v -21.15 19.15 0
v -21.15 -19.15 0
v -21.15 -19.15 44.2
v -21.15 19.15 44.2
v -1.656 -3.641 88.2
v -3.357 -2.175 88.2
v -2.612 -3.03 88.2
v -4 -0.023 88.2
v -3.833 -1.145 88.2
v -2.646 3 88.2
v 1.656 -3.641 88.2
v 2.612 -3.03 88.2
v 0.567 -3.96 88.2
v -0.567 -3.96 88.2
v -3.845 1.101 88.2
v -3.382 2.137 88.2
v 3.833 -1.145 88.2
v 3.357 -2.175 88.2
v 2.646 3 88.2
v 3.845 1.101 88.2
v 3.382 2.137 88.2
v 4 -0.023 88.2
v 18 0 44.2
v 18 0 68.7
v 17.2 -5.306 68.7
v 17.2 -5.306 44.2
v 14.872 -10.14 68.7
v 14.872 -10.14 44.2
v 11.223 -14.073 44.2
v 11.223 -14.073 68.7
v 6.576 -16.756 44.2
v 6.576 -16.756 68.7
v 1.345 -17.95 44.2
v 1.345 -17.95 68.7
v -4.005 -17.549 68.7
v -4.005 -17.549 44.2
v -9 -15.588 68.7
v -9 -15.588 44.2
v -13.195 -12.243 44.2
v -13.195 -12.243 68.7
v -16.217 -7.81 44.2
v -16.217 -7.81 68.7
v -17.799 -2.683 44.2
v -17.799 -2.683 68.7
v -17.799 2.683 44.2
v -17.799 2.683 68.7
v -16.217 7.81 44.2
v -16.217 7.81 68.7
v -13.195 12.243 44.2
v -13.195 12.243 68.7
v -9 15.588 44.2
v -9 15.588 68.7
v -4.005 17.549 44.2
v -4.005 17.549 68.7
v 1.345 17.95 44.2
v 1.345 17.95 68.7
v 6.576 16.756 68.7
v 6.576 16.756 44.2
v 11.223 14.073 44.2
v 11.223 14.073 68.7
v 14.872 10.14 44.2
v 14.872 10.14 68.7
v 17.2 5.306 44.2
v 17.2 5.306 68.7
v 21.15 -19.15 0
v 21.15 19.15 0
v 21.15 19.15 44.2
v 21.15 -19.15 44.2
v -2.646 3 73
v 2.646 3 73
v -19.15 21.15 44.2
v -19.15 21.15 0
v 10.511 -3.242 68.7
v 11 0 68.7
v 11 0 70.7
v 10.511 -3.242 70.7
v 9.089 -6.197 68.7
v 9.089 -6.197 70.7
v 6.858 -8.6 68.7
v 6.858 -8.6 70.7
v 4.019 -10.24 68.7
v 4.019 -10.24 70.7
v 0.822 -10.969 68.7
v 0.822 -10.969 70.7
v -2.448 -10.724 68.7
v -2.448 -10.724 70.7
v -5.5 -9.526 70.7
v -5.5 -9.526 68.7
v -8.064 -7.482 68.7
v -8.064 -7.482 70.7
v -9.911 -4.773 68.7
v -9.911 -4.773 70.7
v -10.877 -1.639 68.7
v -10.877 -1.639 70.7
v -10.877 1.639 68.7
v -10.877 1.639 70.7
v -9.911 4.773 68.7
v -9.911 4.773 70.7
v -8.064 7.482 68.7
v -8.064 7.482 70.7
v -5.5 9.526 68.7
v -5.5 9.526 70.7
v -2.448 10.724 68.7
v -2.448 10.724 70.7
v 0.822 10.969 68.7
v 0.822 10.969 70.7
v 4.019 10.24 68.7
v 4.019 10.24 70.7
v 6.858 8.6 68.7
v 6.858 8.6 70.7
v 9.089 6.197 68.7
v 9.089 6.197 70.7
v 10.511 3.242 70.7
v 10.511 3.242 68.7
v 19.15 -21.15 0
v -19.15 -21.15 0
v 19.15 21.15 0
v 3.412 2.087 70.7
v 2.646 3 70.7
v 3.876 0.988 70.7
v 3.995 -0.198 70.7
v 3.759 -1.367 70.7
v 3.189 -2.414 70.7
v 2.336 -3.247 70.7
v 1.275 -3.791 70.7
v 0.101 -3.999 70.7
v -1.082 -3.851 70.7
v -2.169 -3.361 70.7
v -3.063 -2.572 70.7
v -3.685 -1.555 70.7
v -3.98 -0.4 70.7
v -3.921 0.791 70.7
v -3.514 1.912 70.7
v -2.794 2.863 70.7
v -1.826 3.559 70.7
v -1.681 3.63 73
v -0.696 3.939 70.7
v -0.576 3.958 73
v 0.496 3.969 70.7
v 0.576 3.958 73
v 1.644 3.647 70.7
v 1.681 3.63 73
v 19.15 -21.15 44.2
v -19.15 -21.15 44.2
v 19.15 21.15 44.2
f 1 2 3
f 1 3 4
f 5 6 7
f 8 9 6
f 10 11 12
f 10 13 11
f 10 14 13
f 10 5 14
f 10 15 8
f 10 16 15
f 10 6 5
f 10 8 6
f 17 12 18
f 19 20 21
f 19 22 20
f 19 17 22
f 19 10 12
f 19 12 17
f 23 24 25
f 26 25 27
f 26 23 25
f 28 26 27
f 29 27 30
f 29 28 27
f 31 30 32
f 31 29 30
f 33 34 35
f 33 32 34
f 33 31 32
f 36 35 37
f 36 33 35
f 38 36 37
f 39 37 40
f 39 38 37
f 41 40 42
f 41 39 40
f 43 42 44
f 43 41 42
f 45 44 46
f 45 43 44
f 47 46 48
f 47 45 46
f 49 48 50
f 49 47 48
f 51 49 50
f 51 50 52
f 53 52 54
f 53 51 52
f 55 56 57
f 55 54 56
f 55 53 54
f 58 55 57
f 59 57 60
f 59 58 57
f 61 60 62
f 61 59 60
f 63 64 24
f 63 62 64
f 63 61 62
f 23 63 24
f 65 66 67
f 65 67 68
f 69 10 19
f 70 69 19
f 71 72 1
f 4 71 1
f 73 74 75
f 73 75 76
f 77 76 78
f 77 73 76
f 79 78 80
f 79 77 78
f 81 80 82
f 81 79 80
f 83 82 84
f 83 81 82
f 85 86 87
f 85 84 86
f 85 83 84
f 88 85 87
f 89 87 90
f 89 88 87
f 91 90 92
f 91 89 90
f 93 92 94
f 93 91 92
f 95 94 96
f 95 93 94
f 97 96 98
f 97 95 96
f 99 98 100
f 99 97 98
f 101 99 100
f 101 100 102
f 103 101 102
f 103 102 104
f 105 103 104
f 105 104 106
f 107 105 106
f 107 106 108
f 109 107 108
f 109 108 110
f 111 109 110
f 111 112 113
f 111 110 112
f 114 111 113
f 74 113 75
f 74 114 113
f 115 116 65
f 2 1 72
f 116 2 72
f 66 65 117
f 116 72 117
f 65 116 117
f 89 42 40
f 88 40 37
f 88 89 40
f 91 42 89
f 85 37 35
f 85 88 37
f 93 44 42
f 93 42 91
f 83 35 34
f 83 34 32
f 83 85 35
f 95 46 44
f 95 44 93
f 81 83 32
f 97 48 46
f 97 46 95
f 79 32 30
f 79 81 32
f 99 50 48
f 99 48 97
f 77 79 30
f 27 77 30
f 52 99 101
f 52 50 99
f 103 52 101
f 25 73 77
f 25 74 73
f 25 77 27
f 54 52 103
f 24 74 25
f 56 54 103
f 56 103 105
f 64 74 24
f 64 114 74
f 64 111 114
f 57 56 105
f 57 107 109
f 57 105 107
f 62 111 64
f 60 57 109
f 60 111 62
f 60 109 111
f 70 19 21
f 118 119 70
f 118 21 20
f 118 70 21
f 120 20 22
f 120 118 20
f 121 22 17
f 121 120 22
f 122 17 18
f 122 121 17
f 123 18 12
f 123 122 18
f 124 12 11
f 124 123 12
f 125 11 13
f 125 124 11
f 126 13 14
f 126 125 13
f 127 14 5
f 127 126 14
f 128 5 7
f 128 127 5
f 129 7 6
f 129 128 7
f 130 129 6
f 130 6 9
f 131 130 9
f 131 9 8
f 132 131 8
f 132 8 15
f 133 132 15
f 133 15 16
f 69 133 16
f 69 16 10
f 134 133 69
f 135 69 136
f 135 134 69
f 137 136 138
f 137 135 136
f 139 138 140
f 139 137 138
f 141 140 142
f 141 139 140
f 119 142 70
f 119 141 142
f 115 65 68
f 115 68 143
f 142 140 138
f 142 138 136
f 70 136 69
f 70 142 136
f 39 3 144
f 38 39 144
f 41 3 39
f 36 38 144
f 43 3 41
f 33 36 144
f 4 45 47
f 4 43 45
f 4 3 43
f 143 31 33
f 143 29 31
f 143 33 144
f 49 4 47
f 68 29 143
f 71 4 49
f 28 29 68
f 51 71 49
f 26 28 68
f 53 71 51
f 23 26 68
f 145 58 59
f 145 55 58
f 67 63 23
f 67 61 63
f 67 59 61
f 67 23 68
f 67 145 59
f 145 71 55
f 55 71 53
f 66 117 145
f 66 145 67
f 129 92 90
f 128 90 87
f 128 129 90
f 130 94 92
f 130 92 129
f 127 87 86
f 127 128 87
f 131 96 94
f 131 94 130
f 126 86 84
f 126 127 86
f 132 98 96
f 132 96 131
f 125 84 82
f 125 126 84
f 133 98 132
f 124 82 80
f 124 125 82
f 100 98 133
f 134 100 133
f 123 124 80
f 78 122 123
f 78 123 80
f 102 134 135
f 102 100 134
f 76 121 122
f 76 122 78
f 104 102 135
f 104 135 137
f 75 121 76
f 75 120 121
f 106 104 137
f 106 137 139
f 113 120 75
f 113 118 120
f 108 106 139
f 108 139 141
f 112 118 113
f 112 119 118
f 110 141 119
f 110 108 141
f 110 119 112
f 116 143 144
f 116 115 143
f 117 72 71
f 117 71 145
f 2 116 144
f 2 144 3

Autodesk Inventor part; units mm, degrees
ref_plane "YZ Plane" through (0, 0, 0) normal (1, 0, 0) x (0, 1, 0)
ref_plane "XZ Plane" through (0, 0, 0) normal (0, 1, 0) x (-1, 0, 0)
ref_plane "XY Plane" through (0, 0, 0) normal (0, 0, 1) x (1, 0, 0)
sketch "Sketch1" plane through (0, 0, 0) normal (0, 0, 1) x (1, 0, 0)
  line L0 (-19.15, 21.15) -> (19.15, 21.15)
  line L1 (21.15, 19.15) -> (21.15, -19.15)
  line L2 (19.15, -21.15) -> (-19.15, -21.15)
  line L3 (-21.15, -19.15) -> (-21.15, 19.15)
  line L4 (-19.15, 21.15) -> (-21.15, 19.15)
  line L5 (-19.15, -21.15) -> (-21.15, -19.15)
  line L6 (21.15, -19.15) -> (19.15, -21.15)
  line L7 (19.15, 21.15) -> (21.15, 19.15)
  point P0 (0, 0)
  point P1 (-21.15, 21.15)
  point P2 (21.15, -21.15)
  point P3 (21.15, 21.15)
  point P4 (-21.15, -21.15)
  point P5 (-21.15, 0)
  point P6 (0, 21.15)
  dimension "d0" = 2
  dimension "d1" = 2
  dimension "d2" = 2
  dimension "d3" = 2
  dimension "d4" = 2
  dimension "d5" = 2
  dimension "d6" = 2
  dimension "d7" = 2
  dimension "d8" = 42.3
  dimension "d9" = 42.3
extrude "Extrusion1" add sketch "Sketch1" along normal blind 44.2
sketch "Sketch2" plane through (0, 0, 44.2) normal (0, 0, 1) x (1, 0, 0)
  circle A0 centre (0, 0) radius 18
  dimension "d12" = 36
extrude "Extrusion2" add sketch "Sketch2" along normal blind 24.5
sketch "Sketch3" plane through (0, 0, 68.7) normal (0, 0, 1) x (1, 0, 0)
  circle A0 centre (0, 0) radius 11
  dimension "d15" = 22
extrude "Extrusion3" add sketch "Sketch3" along normal blind 2
sketch "Sketch4" plane through (0, 0, 70.7) normal (0, 0, 1) x (1, 0, 0)
  circle A0 centre (0, 0) radius 4
  line L0 (-2.6458, 3) -> (2.6458, 3)
  dimension "d18" = 8
  dimension "d19" = 7
extrude "Extrusion4" add sketch "Sketch4" along normal blind 17.5 contours A0 L0 picked at (-1.0918, 0.7386)
extrude "Extrusion5" add sketch "Sketch4" along normal blind 2.3 contours L0 A0 picked at (-0.6179, 3.1815)
equation "\"d1\" = d0"
equation "\"d2\" = d0"
equation "\"d3\" = d2"
equation "\"d4\" = d0"
equation "\"d5\" = d4"
equation "\"d6\" = d0"
equation "\"d7\" = d6"
equation "\"d9\" = d8"
properties part number "Gearmotor"
